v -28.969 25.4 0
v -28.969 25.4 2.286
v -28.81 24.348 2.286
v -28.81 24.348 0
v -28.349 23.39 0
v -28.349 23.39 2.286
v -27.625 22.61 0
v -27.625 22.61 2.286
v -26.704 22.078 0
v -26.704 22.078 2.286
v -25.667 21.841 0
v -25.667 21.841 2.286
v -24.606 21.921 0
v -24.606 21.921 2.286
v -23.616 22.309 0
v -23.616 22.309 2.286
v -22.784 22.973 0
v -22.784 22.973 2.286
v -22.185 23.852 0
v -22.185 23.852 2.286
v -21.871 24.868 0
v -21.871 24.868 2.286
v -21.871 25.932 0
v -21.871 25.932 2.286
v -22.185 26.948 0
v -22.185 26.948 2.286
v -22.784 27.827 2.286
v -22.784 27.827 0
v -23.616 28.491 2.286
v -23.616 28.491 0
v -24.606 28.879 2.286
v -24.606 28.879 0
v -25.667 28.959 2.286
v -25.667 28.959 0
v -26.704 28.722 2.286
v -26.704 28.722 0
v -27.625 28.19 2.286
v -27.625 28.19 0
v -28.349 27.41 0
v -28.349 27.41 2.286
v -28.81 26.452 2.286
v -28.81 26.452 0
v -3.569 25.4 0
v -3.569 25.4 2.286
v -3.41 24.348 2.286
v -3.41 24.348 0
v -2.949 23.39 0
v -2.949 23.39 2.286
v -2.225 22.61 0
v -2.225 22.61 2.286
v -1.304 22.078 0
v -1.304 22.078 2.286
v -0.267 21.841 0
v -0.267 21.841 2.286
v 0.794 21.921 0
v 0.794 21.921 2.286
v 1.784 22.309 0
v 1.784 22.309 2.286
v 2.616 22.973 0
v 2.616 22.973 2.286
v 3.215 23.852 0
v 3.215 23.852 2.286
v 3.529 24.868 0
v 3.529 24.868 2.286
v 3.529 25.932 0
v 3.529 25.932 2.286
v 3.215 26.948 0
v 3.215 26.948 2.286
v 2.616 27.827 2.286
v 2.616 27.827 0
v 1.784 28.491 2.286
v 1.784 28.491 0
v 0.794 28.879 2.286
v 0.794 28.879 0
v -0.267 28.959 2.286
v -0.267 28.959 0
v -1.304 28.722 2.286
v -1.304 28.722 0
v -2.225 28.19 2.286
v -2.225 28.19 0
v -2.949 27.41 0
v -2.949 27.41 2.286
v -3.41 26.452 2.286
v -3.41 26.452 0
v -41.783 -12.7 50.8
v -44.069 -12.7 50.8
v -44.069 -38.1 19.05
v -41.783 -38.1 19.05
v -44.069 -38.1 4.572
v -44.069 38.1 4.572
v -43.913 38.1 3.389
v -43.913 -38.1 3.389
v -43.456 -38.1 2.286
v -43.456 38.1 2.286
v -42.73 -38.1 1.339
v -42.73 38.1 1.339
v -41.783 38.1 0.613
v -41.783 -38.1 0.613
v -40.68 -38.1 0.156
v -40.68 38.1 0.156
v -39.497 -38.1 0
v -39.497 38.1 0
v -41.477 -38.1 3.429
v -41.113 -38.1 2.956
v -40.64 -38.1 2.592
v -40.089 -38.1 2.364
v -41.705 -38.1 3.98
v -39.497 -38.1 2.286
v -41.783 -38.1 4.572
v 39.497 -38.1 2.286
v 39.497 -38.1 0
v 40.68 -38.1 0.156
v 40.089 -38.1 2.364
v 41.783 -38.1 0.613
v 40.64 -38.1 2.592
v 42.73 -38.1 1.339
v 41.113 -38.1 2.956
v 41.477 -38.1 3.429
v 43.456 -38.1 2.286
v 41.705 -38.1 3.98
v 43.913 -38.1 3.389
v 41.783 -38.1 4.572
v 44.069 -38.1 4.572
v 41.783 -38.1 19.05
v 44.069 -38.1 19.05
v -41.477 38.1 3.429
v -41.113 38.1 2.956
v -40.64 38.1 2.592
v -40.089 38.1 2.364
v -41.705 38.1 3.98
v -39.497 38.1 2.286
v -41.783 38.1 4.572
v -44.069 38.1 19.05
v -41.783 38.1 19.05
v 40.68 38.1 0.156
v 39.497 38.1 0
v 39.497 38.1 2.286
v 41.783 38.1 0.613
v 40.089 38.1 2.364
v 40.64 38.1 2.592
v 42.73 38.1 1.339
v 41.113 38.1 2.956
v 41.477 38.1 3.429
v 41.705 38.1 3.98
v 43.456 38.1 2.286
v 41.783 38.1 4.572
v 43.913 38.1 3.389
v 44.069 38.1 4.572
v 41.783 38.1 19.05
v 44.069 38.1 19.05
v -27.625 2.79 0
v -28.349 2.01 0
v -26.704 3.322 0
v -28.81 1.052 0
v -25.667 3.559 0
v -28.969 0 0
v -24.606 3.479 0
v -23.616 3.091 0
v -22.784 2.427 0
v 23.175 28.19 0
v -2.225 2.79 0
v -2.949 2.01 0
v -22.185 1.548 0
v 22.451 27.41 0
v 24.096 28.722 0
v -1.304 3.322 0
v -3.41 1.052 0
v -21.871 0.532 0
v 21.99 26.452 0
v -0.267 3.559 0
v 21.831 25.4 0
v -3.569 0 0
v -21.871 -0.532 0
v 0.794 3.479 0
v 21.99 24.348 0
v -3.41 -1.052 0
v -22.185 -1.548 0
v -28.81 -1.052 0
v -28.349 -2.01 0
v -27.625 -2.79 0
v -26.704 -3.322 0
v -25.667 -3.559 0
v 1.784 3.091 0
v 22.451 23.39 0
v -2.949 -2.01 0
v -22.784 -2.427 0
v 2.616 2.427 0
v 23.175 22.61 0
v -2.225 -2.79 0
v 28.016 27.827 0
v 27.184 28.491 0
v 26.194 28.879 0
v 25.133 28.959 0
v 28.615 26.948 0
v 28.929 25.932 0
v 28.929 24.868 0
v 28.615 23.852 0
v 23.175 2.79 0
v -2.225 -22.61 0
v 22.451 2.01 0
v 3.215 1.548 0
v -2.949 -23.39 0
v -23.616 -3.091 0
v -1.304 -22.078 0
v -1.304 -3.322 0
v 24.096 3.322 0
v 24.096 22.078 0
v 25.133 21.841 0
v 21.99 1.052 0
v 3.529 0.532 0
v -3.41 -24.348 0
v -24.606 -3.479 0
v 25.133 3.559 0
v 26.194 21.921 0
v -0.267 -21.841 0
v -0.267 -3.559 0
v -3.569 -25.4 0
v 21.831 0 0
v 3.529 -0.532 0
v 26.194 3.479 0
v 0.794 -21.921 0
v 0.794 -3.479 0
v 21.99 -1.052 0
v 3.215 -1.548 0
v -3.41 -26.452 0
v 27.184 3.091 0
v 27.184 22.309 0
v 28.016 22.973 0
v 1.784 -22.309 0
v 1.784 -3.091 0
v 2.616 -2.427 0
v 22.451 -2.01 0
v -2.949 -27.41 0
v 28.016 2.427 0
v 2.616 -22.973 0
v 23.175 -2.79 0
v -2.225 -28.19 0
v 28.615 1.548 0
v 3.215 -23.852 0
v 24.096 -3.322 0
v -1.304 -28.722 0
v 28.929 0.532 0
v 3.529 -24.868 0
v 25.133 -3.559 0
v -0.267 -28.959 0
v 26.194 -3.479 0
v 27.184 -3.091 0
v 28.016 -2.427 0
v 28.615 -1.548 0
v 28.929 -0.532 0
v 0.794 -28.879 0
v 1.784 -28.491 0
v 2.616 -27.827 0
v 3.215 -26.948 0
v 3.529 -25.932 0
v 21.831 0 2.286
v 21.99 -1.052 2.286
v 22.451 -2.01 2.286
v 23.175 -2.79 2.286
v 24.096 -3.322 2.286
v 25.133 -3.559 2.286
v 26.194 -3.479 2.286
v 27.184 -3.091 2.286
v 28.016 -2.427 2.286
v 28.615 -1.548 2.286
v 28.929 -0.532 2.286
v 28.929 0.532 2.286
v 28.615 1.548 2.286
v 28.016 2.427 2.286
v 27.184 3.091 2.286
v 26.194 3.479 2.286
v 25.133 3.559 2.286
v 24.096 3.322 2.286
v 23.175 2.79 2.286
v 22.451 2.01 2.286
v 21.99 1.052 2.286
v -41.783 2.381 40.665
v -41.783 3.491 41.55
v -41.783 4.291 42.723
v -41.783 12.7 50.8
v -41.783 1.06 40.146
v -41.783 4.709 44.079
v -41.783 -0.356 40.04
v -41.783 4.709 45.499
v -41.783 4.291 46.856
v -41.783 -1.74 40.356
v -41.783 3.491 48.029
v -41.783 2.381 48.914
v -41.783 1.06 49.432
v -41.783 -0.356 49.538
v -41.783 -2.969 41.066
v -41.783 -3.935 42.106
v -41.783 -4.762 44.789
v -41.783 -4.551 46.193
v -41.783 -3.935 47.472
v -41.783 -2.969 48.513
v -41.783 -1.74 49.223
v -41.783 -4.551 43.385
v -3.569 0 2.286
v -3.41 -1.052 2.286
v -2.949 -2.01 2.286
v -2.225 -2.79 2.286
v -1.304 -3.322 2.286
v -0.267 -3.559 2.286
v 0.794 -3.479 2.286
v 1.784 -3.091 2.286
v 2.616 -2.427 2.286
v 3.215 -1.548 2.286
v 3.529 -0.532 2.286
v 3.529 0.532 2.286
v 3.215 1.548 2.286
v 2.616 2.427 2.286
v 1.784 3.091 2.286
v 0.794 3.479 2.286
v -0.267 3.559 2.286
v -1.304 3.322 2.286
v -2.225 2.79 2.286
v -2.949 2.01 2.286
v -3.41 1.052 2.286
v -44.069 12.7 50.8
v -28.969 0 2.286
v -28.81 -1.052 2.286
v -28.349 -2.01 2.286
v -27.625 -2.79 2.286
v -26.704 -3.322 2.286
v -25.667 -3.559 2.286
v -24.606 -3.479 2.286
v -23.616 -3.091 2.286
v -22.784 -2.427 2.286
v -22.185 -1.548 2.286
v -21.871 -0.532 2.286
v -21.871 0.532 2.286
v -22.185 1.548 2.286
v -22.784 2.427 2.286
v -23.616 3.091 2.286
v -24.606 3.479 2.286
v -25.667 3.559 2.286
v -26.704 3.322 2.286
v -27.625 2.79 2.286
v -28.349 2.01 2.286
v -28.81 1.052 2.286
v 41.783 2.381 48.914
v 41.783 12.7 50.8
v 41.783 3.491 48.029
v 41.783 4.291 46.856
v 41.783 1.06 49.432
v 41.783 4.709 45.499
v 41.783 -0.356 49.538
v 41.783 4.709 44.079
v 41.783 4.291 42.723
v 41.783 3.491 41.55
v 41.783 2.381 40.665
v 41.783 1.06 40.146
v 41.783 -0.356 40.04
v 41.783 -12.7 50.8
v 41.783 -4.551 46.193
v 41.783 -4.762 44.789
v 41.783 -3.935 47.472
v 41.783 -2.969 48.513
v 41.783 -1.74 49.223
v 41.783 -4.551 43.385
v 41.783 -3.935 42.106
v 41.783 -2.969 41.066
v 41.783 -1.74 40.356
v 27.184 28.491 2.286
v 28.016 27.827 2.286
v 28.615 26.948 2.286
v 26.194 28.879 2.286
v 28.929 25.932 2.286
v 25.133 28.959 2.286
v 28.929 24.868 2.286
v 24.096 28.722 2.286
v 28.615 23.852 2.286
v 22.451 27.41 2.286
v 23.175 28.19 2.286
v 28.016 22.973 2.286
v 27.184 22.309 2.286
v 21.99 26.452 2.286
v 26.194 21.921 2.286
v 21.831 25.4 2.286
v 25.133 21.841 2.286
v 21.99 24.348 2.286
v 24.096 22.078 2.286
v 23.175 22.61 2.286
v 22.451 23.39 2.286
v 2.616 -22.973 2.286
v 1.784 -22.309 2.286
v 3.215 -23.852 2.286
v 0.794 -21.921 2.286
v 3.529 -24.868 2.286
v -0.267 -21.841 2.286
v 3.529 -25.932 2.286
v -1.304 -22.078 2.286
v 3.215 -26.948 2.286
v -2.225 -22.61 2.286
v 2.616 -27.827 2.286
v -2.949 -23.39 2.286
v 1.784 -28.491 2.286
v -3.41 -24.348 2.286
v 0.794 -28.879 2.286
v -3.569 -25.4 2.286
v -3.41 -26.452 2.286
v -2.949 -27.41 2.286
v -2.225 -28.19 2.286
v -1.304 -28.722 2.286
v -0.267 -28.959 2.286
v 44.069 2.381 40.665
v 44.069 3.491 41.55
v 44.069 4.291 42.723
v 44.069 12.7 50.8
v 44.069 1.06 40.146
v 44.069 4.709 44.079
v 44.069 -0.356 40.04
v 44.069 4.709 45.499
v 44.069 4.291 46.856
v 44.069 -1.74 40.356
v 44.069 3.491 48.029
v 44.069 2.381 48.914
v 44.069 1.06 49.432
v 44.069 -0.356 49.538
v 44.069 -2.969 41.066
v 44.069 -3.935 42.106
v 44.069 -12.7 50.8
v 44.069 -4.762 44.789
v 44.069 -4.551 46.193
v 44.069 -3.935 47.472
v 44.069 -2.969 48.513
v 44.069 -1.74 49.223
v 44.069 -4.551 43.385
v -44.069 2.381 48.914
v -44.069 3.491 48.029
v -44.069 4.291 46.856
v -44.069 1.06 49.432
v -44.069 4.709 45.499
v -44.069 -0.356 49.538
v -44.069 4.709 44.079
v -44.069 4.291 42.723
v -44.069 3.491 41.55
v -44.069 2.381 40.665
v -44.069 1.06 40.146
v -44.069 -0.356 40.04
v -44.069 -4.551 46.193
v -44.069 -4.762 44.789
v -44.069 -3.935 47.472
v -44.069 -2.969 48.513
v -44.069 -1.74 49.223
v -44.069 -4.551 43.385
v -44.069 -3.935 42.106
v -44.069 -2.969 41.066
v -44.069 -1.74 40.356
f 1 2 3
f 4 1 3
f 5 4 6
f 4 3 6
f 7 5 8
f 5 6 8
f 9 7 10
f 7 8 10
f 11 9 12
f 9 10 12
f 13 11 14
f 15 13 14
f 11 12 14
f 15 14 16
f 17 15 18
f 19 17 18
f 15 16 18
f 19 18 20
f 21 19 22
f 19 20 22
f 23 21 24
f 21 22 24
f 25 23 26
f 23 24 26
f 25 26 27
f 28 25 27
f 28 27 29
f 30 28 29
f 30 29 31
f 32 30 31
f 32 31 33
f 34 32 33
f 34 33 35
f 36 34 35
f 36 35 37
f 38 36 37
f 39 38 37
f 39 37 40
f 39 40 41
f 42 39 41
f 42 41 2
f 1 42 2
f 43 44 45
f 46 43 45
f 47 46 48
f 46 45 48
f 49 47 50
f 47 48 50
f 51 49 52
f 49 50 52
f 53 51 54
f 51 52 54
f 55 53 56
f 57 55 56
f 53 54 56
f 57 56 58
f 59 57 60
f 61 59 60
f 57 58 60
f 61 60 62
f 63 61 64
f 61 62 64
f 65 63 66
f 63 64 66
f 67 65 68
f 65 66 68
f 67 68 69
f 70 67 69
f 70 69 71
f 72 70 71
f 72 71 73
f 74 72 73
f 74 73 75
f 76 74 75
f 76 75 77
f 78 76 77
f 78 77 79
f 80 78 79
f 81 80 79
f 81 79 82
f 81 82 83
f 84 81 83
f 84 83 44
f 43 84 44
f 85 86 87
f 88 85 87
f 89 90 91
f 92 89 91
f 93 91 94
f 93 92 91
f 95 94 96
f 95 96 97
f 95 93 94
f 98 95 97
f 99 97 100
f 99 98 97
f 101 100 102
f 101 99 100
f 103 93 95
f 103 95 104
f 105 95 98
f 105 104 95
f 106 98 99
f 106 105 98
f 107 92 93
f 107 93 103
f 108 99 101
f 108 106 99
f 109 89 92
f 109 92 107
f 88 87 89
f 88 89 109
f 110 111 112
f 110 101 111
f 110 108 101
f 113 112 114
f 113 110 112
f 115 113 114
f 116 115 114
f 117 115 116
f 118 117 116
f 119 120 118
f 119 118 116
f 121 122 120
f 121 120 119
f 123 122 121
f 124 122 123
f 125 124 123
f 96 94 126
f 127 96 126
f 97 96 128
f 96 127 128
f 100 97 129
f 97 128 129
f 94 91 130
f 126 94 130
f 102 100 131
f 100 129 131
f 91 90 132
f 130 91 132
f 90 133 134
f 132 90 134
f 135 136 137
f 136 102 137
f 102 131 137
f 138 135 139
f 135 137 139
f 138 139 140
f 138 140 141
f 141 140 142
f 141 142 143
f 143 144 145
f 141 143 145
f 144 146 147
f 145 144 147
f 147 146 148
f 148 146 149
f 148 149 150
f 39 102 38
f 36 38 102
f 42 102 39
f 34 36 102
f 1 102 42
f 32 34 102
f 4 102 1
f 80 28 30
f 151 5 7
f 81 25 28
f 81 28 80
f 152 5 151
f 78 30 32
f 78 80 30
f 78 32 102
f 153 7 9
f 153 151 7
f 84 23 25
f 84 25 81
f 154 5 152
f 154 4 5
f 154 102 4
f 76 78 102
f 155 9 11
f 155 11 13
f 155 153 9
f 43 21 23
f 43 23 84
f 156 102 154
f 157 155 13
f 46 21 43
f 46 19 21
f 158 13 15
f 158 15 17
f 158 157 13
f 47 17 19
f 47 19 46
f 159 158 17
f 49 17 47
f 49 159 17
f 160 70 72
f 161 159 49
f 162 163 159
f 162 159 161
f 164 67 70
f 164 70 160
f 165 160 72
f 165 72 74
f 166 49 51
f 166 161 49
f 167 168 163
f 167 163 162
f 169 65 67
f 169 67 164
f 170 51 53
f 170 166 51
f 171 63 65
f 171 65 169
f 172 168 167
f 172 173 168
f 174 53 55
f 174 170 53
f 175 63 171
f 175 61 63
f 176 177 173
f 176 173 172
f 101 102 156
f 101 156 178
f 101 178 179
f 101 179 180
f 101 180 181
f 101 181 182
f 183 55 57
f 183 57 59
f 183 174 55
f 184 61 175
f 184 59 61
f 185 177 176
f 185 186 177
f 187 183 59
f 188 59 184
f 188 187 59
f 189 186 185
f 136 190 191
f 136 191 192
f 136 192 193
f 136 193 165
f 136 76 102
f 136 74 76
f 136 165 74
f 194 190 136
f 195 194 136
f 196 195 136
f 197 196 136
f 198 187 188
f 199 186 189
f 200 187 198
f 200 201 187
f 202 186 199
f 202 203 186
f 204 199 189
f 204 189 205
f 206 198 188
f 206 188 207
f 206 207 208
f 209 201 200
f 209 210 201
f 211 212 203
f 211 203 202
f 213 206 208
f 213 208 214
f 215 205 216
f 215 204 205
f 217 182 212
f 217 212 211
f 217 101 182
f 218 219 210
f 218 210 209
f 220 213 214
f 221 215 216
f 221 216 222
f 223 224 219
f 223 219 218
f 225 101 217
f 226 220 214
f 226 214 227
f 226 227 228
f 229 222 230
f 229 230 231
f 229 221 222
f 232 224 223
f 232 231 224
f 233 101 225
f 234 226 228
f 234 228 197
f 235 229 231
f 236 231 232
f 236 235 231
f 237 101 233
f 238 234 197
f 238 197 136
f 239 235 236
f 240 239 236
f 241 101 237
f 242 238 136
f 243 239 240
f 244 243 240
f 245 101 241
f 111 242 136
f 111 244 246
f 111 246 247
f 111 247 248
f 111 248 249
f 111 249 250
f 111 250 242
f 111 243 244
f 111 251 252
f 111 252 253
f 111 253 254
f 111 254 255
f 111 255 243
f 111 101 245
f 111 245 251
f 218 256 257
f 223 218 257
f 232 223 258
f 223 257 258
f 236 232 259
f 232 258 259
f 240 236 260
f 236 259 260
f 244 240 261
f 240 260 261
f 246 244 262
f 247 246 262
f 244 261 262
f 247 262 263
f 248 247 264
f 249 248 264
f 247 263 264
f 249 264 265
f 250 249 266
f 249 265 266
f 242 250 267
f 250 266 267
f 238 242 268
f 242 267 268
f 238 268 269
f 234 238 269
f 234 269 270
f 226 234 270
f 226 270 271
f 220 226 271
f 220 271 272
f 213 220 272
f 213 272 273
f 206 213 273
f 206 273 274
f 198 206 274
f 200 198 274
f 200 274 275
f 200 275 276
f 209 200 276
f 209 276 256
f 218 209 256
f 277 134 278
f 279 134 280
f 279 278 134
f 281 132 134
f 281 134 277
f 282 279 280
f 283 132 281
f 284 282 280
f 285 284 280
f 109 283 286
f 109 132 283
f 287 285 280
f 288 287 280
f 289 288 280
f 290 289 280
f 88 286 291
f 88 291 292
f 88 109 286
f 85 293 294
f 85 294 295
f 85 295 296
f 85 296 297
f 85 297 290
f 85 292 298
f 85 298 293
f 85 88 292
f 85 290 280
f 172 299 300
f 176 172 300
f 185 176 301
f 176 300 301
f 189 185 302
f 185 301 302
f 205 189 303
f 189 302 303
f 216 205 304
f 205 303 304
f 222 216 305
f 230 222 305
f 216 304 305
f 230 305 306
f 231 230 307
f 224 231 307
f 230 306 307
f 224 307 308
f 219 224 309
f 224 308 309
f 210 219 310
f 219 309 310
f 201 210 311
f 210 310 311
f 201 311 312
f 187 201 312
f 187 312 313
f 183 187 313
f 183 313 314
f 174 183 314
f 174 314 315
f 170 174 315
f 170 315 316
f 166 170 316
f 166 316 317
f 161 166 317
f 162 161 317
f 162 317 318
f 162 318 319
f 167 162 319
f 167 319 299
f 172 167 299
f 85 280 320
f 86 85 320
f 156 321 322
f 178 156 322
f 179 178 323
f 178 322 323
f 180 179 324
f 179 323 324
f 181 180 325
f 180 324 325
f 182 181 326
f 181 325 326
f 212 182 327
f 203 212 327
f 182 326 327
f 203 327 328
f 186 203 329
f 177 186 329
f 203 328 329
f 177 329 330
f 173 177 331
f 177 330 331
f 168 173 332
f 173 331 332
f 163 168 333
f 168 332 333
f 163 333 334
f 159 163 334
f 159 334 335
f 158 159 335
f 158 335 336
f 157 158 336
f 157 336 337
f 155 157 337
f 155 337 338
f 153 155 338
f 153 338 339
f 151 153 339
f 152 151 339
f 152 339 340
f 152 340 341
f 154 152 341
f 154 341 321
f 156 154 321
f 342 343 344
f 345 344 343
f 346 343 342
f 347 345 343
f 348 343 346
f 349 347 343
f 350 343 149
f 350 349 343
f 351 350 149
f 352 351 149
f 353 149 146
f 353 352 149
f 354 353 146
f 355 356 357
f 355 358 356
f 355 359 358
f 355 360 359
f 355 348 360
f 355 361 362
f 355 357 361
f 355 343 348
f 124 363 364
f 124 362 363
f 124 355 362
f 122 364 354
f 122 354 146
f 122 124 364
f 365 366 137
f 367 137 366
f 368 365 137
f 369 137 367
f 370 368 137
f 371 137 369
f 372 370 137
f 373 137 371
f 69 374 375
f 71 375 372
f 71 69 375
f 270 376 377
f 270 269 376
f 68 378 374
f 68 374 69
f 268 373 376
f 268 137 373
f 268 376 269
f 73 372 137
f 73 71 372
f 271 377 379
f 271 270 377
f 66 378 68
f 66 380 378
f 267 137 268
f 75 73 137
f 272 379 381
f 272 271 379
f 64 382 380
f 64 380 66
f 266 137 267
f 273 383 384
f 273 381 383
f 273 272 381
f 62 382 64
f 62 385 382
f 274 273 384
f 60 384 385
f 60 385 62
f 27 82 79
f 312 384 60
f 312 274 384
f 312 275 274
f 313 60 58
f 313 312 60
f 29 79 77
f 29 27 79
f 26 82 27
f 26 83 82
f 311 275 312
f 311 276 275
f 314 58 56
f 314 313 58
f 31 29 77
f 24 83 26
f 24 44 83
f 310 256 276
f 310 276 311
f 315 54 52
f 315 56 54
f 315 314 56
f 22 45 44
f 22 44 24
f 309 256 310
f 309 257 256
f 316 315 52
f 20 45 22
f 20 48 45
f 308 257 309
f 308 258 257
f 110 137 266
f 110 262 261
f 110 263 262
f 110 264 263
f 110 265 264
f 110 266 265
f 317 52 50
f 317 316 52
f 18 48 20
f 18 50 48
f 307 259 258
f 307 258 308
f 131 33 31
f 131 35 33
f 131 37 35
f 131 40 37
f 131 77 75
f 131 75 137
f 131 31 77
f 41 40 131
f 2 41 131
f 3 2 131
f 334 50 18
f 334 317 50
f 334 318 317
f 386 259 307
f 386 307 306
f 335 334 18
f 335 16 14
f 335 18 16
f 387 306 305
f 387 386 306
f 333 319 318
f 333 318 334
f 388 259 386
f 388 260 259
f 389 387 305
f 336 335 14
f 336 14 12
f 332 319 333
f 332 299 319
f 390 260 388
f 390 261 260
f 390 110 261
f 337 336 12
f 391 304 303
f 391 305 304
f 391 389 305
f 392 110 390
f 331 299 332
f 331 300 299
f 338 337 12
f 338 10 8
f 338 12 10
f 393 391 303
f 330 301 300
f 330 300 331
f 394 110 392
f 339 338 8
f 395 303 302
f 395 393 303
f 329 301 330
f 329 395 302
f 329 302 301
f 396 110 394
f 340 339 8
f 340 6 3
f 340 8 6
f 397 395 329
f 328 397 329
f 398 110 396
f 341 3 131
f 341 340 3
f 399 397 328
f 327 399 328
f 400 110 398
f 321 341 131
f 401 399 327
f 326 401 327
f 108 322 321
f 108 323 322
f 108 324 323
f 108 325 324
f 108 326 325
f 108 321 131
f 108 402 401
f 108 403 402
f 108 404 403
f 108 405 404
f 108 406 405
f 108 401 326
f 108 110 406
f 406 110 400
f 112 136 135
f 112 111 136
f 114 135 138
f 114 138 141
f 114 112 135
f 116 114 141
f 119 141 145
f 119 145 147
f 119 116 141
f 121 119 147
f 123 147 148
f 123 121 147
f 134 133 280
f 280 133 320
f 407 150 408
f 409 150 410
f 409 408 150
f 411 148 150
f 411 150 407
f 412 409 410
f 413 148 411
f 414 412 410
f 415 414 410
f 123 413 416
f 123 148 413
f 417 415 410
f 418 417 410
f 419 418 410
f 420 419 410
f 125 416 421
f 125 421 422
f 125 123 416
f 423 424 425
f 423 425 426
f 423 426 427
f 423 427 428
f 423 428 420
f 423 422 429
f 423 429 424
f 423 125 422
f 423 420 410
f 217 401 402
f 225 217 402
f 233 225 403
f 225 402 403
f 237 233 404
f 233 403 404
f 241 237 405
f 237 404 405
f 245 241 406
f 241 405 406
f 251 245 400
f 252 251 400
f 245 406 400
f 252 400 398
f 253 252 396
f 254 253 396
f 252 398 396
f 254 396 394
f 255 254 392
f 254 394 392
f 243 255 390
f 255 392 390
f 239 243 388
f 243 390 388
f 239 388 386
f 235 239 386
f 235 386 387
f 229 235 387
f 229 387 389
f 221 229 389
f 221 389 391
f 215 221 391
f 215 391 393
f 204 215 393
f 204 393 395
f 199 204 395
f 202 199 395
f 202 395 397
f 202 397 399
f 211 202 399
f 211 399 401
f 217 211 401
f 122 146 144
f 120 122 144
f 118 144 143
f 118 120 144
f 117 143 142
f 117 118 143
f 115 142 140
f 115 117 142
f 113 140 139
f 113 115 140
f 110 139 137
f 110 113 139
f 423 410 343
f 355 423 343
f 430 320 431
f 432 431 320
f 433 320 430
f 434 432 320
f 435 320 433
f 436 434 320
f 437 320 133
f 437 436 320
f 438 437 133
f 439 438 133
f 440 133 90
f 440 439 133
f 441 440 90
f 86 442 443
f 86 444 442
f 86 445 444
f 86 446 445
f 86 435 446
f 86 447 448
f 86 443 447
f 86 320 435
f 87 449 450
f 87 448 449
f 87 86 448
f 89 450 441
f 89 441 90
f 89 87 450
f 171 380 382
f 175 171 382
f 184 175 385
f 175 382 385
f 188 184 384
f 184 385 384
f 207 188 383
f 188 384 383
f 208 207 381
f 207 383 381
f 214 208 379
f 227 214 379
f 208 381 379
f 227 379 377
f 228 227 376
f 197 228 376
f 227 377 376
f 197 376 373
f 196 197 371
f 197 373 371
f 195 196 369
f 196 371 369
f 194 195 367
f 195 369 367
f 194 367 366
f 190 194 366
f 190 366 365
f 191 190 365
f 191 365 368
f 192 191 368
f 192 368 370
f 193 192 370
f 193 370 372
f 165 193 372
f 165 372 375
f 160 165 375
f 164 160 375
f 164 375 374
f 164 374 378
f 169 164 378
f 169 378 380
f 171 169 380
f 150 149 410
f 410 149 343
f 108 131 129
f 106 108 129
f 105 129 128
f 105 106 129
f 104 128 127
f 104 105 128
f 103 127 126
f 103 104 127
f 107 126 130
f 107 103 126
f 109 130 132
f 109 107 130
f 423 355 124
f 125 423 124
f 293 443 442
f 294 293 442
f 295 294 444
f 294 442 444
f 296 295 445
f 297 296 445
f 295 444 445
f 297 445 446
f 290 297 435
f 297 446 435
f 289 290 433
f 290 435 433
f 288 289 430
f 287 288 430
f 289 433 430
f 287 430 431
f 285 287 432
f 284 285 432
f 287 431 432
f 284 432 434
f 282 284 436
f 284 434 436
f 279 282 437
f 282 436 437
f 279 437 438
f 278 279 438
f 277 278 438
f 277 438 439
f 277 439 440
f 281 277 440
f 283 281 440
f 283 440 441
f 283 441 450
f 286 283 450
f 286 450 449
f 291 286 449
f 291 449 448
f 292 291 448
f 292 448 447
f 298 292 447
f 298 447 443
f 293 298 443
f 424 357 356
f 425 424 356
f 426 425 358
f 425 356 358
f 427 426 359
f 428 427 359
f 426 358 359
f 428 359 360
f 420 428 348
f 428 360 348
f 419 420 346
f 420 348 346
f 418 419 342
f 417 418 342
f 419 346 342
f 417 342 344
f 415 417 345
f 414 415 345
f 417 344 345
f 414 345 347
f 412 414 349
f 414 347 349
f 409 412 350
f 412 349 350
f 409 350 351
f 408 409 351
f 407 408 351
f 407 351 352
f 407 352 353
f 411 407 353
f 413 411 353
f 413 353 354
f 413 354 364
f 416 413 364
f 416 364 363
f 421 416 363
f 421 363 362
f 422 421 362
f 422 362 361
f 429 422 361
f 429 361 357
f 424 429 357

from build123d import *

# Parameters (mm, degrees)
F1_DEPTH = 38.1
F2_R     = 4.7625
F3_DEPTH = 88.139
F5_D     = 7.1374


with BuildPart() as f1:
    # F0 (on Front) → F1 (new body, symmetric)
    with BuildSketch(Plane.XZ):
        with BuildLine():
            Line((44.069, 4.572), (44.069, 50.8))
            Line((44.069, 50.8), (41.783, 50.8))
            Line((41.783, 50.8), (41.783, 4.572))
            ThreePointArc((41.783, 4.572), (41.113446, 2.955554), (39.497, 2.286))
            Line((39.497, 2.286), (-39.497, 2.286))
            ThreePointArc((-39.497, 2.286), (-41.113446, 2.955554), (-41.783, 4.572))
            Line((-41.783, 4.572), (-41.783, 50.8))
            Line((-41.783, 50.8), (-44.069, 50.8))
            Line((-44.069, 50.8), (-44.069, 4.572))
            ThreePointArc((-44.069, 4.572), (-42.729892, 1.339108), (-39.497, 0))
            Line((-39.497, 0), (39.497, 0))
            ThreePointArc((39.497, 0), (42.729892, 1.339108), (44.069, 4.572))
        make_face()
    extrude(amount=F1_DEPTH, both=True)

    # F2 (on face) → F3 (cut, through all)
    with BuildSketch(Plane(origin=(-44.069, 0, 0), x_dir=(0, -1, 0), z_dir=(-1, 0, 0))):
        Polygon((12.7, 50.8), (38.1, 19.05), (38.1, 50.8), align=None)
        with Locations((0, 44.789256)):
            Circle(F2_R)
        Polygon((-38.1, 19.05), (-12.7, 50.8), (-38.1, 50.8), align=None)
    extrude(amount=-F3_DEPTH, mode=Mode.SUBTRACT)

    # F5 (through all)
    with Locations(Plane(origin=(0, 0, 0), x_dir=(1, 0, 0), z_dir=(0, 0, -1))):
        with Locations((0, 25.4), (25.4, 0), (0, 0), (-25.4, 0), (-25.4, -25.4), (0, -25.4), (25.4, -25.4)):
            Hole(F5_D / 2)


solid = f1.part
